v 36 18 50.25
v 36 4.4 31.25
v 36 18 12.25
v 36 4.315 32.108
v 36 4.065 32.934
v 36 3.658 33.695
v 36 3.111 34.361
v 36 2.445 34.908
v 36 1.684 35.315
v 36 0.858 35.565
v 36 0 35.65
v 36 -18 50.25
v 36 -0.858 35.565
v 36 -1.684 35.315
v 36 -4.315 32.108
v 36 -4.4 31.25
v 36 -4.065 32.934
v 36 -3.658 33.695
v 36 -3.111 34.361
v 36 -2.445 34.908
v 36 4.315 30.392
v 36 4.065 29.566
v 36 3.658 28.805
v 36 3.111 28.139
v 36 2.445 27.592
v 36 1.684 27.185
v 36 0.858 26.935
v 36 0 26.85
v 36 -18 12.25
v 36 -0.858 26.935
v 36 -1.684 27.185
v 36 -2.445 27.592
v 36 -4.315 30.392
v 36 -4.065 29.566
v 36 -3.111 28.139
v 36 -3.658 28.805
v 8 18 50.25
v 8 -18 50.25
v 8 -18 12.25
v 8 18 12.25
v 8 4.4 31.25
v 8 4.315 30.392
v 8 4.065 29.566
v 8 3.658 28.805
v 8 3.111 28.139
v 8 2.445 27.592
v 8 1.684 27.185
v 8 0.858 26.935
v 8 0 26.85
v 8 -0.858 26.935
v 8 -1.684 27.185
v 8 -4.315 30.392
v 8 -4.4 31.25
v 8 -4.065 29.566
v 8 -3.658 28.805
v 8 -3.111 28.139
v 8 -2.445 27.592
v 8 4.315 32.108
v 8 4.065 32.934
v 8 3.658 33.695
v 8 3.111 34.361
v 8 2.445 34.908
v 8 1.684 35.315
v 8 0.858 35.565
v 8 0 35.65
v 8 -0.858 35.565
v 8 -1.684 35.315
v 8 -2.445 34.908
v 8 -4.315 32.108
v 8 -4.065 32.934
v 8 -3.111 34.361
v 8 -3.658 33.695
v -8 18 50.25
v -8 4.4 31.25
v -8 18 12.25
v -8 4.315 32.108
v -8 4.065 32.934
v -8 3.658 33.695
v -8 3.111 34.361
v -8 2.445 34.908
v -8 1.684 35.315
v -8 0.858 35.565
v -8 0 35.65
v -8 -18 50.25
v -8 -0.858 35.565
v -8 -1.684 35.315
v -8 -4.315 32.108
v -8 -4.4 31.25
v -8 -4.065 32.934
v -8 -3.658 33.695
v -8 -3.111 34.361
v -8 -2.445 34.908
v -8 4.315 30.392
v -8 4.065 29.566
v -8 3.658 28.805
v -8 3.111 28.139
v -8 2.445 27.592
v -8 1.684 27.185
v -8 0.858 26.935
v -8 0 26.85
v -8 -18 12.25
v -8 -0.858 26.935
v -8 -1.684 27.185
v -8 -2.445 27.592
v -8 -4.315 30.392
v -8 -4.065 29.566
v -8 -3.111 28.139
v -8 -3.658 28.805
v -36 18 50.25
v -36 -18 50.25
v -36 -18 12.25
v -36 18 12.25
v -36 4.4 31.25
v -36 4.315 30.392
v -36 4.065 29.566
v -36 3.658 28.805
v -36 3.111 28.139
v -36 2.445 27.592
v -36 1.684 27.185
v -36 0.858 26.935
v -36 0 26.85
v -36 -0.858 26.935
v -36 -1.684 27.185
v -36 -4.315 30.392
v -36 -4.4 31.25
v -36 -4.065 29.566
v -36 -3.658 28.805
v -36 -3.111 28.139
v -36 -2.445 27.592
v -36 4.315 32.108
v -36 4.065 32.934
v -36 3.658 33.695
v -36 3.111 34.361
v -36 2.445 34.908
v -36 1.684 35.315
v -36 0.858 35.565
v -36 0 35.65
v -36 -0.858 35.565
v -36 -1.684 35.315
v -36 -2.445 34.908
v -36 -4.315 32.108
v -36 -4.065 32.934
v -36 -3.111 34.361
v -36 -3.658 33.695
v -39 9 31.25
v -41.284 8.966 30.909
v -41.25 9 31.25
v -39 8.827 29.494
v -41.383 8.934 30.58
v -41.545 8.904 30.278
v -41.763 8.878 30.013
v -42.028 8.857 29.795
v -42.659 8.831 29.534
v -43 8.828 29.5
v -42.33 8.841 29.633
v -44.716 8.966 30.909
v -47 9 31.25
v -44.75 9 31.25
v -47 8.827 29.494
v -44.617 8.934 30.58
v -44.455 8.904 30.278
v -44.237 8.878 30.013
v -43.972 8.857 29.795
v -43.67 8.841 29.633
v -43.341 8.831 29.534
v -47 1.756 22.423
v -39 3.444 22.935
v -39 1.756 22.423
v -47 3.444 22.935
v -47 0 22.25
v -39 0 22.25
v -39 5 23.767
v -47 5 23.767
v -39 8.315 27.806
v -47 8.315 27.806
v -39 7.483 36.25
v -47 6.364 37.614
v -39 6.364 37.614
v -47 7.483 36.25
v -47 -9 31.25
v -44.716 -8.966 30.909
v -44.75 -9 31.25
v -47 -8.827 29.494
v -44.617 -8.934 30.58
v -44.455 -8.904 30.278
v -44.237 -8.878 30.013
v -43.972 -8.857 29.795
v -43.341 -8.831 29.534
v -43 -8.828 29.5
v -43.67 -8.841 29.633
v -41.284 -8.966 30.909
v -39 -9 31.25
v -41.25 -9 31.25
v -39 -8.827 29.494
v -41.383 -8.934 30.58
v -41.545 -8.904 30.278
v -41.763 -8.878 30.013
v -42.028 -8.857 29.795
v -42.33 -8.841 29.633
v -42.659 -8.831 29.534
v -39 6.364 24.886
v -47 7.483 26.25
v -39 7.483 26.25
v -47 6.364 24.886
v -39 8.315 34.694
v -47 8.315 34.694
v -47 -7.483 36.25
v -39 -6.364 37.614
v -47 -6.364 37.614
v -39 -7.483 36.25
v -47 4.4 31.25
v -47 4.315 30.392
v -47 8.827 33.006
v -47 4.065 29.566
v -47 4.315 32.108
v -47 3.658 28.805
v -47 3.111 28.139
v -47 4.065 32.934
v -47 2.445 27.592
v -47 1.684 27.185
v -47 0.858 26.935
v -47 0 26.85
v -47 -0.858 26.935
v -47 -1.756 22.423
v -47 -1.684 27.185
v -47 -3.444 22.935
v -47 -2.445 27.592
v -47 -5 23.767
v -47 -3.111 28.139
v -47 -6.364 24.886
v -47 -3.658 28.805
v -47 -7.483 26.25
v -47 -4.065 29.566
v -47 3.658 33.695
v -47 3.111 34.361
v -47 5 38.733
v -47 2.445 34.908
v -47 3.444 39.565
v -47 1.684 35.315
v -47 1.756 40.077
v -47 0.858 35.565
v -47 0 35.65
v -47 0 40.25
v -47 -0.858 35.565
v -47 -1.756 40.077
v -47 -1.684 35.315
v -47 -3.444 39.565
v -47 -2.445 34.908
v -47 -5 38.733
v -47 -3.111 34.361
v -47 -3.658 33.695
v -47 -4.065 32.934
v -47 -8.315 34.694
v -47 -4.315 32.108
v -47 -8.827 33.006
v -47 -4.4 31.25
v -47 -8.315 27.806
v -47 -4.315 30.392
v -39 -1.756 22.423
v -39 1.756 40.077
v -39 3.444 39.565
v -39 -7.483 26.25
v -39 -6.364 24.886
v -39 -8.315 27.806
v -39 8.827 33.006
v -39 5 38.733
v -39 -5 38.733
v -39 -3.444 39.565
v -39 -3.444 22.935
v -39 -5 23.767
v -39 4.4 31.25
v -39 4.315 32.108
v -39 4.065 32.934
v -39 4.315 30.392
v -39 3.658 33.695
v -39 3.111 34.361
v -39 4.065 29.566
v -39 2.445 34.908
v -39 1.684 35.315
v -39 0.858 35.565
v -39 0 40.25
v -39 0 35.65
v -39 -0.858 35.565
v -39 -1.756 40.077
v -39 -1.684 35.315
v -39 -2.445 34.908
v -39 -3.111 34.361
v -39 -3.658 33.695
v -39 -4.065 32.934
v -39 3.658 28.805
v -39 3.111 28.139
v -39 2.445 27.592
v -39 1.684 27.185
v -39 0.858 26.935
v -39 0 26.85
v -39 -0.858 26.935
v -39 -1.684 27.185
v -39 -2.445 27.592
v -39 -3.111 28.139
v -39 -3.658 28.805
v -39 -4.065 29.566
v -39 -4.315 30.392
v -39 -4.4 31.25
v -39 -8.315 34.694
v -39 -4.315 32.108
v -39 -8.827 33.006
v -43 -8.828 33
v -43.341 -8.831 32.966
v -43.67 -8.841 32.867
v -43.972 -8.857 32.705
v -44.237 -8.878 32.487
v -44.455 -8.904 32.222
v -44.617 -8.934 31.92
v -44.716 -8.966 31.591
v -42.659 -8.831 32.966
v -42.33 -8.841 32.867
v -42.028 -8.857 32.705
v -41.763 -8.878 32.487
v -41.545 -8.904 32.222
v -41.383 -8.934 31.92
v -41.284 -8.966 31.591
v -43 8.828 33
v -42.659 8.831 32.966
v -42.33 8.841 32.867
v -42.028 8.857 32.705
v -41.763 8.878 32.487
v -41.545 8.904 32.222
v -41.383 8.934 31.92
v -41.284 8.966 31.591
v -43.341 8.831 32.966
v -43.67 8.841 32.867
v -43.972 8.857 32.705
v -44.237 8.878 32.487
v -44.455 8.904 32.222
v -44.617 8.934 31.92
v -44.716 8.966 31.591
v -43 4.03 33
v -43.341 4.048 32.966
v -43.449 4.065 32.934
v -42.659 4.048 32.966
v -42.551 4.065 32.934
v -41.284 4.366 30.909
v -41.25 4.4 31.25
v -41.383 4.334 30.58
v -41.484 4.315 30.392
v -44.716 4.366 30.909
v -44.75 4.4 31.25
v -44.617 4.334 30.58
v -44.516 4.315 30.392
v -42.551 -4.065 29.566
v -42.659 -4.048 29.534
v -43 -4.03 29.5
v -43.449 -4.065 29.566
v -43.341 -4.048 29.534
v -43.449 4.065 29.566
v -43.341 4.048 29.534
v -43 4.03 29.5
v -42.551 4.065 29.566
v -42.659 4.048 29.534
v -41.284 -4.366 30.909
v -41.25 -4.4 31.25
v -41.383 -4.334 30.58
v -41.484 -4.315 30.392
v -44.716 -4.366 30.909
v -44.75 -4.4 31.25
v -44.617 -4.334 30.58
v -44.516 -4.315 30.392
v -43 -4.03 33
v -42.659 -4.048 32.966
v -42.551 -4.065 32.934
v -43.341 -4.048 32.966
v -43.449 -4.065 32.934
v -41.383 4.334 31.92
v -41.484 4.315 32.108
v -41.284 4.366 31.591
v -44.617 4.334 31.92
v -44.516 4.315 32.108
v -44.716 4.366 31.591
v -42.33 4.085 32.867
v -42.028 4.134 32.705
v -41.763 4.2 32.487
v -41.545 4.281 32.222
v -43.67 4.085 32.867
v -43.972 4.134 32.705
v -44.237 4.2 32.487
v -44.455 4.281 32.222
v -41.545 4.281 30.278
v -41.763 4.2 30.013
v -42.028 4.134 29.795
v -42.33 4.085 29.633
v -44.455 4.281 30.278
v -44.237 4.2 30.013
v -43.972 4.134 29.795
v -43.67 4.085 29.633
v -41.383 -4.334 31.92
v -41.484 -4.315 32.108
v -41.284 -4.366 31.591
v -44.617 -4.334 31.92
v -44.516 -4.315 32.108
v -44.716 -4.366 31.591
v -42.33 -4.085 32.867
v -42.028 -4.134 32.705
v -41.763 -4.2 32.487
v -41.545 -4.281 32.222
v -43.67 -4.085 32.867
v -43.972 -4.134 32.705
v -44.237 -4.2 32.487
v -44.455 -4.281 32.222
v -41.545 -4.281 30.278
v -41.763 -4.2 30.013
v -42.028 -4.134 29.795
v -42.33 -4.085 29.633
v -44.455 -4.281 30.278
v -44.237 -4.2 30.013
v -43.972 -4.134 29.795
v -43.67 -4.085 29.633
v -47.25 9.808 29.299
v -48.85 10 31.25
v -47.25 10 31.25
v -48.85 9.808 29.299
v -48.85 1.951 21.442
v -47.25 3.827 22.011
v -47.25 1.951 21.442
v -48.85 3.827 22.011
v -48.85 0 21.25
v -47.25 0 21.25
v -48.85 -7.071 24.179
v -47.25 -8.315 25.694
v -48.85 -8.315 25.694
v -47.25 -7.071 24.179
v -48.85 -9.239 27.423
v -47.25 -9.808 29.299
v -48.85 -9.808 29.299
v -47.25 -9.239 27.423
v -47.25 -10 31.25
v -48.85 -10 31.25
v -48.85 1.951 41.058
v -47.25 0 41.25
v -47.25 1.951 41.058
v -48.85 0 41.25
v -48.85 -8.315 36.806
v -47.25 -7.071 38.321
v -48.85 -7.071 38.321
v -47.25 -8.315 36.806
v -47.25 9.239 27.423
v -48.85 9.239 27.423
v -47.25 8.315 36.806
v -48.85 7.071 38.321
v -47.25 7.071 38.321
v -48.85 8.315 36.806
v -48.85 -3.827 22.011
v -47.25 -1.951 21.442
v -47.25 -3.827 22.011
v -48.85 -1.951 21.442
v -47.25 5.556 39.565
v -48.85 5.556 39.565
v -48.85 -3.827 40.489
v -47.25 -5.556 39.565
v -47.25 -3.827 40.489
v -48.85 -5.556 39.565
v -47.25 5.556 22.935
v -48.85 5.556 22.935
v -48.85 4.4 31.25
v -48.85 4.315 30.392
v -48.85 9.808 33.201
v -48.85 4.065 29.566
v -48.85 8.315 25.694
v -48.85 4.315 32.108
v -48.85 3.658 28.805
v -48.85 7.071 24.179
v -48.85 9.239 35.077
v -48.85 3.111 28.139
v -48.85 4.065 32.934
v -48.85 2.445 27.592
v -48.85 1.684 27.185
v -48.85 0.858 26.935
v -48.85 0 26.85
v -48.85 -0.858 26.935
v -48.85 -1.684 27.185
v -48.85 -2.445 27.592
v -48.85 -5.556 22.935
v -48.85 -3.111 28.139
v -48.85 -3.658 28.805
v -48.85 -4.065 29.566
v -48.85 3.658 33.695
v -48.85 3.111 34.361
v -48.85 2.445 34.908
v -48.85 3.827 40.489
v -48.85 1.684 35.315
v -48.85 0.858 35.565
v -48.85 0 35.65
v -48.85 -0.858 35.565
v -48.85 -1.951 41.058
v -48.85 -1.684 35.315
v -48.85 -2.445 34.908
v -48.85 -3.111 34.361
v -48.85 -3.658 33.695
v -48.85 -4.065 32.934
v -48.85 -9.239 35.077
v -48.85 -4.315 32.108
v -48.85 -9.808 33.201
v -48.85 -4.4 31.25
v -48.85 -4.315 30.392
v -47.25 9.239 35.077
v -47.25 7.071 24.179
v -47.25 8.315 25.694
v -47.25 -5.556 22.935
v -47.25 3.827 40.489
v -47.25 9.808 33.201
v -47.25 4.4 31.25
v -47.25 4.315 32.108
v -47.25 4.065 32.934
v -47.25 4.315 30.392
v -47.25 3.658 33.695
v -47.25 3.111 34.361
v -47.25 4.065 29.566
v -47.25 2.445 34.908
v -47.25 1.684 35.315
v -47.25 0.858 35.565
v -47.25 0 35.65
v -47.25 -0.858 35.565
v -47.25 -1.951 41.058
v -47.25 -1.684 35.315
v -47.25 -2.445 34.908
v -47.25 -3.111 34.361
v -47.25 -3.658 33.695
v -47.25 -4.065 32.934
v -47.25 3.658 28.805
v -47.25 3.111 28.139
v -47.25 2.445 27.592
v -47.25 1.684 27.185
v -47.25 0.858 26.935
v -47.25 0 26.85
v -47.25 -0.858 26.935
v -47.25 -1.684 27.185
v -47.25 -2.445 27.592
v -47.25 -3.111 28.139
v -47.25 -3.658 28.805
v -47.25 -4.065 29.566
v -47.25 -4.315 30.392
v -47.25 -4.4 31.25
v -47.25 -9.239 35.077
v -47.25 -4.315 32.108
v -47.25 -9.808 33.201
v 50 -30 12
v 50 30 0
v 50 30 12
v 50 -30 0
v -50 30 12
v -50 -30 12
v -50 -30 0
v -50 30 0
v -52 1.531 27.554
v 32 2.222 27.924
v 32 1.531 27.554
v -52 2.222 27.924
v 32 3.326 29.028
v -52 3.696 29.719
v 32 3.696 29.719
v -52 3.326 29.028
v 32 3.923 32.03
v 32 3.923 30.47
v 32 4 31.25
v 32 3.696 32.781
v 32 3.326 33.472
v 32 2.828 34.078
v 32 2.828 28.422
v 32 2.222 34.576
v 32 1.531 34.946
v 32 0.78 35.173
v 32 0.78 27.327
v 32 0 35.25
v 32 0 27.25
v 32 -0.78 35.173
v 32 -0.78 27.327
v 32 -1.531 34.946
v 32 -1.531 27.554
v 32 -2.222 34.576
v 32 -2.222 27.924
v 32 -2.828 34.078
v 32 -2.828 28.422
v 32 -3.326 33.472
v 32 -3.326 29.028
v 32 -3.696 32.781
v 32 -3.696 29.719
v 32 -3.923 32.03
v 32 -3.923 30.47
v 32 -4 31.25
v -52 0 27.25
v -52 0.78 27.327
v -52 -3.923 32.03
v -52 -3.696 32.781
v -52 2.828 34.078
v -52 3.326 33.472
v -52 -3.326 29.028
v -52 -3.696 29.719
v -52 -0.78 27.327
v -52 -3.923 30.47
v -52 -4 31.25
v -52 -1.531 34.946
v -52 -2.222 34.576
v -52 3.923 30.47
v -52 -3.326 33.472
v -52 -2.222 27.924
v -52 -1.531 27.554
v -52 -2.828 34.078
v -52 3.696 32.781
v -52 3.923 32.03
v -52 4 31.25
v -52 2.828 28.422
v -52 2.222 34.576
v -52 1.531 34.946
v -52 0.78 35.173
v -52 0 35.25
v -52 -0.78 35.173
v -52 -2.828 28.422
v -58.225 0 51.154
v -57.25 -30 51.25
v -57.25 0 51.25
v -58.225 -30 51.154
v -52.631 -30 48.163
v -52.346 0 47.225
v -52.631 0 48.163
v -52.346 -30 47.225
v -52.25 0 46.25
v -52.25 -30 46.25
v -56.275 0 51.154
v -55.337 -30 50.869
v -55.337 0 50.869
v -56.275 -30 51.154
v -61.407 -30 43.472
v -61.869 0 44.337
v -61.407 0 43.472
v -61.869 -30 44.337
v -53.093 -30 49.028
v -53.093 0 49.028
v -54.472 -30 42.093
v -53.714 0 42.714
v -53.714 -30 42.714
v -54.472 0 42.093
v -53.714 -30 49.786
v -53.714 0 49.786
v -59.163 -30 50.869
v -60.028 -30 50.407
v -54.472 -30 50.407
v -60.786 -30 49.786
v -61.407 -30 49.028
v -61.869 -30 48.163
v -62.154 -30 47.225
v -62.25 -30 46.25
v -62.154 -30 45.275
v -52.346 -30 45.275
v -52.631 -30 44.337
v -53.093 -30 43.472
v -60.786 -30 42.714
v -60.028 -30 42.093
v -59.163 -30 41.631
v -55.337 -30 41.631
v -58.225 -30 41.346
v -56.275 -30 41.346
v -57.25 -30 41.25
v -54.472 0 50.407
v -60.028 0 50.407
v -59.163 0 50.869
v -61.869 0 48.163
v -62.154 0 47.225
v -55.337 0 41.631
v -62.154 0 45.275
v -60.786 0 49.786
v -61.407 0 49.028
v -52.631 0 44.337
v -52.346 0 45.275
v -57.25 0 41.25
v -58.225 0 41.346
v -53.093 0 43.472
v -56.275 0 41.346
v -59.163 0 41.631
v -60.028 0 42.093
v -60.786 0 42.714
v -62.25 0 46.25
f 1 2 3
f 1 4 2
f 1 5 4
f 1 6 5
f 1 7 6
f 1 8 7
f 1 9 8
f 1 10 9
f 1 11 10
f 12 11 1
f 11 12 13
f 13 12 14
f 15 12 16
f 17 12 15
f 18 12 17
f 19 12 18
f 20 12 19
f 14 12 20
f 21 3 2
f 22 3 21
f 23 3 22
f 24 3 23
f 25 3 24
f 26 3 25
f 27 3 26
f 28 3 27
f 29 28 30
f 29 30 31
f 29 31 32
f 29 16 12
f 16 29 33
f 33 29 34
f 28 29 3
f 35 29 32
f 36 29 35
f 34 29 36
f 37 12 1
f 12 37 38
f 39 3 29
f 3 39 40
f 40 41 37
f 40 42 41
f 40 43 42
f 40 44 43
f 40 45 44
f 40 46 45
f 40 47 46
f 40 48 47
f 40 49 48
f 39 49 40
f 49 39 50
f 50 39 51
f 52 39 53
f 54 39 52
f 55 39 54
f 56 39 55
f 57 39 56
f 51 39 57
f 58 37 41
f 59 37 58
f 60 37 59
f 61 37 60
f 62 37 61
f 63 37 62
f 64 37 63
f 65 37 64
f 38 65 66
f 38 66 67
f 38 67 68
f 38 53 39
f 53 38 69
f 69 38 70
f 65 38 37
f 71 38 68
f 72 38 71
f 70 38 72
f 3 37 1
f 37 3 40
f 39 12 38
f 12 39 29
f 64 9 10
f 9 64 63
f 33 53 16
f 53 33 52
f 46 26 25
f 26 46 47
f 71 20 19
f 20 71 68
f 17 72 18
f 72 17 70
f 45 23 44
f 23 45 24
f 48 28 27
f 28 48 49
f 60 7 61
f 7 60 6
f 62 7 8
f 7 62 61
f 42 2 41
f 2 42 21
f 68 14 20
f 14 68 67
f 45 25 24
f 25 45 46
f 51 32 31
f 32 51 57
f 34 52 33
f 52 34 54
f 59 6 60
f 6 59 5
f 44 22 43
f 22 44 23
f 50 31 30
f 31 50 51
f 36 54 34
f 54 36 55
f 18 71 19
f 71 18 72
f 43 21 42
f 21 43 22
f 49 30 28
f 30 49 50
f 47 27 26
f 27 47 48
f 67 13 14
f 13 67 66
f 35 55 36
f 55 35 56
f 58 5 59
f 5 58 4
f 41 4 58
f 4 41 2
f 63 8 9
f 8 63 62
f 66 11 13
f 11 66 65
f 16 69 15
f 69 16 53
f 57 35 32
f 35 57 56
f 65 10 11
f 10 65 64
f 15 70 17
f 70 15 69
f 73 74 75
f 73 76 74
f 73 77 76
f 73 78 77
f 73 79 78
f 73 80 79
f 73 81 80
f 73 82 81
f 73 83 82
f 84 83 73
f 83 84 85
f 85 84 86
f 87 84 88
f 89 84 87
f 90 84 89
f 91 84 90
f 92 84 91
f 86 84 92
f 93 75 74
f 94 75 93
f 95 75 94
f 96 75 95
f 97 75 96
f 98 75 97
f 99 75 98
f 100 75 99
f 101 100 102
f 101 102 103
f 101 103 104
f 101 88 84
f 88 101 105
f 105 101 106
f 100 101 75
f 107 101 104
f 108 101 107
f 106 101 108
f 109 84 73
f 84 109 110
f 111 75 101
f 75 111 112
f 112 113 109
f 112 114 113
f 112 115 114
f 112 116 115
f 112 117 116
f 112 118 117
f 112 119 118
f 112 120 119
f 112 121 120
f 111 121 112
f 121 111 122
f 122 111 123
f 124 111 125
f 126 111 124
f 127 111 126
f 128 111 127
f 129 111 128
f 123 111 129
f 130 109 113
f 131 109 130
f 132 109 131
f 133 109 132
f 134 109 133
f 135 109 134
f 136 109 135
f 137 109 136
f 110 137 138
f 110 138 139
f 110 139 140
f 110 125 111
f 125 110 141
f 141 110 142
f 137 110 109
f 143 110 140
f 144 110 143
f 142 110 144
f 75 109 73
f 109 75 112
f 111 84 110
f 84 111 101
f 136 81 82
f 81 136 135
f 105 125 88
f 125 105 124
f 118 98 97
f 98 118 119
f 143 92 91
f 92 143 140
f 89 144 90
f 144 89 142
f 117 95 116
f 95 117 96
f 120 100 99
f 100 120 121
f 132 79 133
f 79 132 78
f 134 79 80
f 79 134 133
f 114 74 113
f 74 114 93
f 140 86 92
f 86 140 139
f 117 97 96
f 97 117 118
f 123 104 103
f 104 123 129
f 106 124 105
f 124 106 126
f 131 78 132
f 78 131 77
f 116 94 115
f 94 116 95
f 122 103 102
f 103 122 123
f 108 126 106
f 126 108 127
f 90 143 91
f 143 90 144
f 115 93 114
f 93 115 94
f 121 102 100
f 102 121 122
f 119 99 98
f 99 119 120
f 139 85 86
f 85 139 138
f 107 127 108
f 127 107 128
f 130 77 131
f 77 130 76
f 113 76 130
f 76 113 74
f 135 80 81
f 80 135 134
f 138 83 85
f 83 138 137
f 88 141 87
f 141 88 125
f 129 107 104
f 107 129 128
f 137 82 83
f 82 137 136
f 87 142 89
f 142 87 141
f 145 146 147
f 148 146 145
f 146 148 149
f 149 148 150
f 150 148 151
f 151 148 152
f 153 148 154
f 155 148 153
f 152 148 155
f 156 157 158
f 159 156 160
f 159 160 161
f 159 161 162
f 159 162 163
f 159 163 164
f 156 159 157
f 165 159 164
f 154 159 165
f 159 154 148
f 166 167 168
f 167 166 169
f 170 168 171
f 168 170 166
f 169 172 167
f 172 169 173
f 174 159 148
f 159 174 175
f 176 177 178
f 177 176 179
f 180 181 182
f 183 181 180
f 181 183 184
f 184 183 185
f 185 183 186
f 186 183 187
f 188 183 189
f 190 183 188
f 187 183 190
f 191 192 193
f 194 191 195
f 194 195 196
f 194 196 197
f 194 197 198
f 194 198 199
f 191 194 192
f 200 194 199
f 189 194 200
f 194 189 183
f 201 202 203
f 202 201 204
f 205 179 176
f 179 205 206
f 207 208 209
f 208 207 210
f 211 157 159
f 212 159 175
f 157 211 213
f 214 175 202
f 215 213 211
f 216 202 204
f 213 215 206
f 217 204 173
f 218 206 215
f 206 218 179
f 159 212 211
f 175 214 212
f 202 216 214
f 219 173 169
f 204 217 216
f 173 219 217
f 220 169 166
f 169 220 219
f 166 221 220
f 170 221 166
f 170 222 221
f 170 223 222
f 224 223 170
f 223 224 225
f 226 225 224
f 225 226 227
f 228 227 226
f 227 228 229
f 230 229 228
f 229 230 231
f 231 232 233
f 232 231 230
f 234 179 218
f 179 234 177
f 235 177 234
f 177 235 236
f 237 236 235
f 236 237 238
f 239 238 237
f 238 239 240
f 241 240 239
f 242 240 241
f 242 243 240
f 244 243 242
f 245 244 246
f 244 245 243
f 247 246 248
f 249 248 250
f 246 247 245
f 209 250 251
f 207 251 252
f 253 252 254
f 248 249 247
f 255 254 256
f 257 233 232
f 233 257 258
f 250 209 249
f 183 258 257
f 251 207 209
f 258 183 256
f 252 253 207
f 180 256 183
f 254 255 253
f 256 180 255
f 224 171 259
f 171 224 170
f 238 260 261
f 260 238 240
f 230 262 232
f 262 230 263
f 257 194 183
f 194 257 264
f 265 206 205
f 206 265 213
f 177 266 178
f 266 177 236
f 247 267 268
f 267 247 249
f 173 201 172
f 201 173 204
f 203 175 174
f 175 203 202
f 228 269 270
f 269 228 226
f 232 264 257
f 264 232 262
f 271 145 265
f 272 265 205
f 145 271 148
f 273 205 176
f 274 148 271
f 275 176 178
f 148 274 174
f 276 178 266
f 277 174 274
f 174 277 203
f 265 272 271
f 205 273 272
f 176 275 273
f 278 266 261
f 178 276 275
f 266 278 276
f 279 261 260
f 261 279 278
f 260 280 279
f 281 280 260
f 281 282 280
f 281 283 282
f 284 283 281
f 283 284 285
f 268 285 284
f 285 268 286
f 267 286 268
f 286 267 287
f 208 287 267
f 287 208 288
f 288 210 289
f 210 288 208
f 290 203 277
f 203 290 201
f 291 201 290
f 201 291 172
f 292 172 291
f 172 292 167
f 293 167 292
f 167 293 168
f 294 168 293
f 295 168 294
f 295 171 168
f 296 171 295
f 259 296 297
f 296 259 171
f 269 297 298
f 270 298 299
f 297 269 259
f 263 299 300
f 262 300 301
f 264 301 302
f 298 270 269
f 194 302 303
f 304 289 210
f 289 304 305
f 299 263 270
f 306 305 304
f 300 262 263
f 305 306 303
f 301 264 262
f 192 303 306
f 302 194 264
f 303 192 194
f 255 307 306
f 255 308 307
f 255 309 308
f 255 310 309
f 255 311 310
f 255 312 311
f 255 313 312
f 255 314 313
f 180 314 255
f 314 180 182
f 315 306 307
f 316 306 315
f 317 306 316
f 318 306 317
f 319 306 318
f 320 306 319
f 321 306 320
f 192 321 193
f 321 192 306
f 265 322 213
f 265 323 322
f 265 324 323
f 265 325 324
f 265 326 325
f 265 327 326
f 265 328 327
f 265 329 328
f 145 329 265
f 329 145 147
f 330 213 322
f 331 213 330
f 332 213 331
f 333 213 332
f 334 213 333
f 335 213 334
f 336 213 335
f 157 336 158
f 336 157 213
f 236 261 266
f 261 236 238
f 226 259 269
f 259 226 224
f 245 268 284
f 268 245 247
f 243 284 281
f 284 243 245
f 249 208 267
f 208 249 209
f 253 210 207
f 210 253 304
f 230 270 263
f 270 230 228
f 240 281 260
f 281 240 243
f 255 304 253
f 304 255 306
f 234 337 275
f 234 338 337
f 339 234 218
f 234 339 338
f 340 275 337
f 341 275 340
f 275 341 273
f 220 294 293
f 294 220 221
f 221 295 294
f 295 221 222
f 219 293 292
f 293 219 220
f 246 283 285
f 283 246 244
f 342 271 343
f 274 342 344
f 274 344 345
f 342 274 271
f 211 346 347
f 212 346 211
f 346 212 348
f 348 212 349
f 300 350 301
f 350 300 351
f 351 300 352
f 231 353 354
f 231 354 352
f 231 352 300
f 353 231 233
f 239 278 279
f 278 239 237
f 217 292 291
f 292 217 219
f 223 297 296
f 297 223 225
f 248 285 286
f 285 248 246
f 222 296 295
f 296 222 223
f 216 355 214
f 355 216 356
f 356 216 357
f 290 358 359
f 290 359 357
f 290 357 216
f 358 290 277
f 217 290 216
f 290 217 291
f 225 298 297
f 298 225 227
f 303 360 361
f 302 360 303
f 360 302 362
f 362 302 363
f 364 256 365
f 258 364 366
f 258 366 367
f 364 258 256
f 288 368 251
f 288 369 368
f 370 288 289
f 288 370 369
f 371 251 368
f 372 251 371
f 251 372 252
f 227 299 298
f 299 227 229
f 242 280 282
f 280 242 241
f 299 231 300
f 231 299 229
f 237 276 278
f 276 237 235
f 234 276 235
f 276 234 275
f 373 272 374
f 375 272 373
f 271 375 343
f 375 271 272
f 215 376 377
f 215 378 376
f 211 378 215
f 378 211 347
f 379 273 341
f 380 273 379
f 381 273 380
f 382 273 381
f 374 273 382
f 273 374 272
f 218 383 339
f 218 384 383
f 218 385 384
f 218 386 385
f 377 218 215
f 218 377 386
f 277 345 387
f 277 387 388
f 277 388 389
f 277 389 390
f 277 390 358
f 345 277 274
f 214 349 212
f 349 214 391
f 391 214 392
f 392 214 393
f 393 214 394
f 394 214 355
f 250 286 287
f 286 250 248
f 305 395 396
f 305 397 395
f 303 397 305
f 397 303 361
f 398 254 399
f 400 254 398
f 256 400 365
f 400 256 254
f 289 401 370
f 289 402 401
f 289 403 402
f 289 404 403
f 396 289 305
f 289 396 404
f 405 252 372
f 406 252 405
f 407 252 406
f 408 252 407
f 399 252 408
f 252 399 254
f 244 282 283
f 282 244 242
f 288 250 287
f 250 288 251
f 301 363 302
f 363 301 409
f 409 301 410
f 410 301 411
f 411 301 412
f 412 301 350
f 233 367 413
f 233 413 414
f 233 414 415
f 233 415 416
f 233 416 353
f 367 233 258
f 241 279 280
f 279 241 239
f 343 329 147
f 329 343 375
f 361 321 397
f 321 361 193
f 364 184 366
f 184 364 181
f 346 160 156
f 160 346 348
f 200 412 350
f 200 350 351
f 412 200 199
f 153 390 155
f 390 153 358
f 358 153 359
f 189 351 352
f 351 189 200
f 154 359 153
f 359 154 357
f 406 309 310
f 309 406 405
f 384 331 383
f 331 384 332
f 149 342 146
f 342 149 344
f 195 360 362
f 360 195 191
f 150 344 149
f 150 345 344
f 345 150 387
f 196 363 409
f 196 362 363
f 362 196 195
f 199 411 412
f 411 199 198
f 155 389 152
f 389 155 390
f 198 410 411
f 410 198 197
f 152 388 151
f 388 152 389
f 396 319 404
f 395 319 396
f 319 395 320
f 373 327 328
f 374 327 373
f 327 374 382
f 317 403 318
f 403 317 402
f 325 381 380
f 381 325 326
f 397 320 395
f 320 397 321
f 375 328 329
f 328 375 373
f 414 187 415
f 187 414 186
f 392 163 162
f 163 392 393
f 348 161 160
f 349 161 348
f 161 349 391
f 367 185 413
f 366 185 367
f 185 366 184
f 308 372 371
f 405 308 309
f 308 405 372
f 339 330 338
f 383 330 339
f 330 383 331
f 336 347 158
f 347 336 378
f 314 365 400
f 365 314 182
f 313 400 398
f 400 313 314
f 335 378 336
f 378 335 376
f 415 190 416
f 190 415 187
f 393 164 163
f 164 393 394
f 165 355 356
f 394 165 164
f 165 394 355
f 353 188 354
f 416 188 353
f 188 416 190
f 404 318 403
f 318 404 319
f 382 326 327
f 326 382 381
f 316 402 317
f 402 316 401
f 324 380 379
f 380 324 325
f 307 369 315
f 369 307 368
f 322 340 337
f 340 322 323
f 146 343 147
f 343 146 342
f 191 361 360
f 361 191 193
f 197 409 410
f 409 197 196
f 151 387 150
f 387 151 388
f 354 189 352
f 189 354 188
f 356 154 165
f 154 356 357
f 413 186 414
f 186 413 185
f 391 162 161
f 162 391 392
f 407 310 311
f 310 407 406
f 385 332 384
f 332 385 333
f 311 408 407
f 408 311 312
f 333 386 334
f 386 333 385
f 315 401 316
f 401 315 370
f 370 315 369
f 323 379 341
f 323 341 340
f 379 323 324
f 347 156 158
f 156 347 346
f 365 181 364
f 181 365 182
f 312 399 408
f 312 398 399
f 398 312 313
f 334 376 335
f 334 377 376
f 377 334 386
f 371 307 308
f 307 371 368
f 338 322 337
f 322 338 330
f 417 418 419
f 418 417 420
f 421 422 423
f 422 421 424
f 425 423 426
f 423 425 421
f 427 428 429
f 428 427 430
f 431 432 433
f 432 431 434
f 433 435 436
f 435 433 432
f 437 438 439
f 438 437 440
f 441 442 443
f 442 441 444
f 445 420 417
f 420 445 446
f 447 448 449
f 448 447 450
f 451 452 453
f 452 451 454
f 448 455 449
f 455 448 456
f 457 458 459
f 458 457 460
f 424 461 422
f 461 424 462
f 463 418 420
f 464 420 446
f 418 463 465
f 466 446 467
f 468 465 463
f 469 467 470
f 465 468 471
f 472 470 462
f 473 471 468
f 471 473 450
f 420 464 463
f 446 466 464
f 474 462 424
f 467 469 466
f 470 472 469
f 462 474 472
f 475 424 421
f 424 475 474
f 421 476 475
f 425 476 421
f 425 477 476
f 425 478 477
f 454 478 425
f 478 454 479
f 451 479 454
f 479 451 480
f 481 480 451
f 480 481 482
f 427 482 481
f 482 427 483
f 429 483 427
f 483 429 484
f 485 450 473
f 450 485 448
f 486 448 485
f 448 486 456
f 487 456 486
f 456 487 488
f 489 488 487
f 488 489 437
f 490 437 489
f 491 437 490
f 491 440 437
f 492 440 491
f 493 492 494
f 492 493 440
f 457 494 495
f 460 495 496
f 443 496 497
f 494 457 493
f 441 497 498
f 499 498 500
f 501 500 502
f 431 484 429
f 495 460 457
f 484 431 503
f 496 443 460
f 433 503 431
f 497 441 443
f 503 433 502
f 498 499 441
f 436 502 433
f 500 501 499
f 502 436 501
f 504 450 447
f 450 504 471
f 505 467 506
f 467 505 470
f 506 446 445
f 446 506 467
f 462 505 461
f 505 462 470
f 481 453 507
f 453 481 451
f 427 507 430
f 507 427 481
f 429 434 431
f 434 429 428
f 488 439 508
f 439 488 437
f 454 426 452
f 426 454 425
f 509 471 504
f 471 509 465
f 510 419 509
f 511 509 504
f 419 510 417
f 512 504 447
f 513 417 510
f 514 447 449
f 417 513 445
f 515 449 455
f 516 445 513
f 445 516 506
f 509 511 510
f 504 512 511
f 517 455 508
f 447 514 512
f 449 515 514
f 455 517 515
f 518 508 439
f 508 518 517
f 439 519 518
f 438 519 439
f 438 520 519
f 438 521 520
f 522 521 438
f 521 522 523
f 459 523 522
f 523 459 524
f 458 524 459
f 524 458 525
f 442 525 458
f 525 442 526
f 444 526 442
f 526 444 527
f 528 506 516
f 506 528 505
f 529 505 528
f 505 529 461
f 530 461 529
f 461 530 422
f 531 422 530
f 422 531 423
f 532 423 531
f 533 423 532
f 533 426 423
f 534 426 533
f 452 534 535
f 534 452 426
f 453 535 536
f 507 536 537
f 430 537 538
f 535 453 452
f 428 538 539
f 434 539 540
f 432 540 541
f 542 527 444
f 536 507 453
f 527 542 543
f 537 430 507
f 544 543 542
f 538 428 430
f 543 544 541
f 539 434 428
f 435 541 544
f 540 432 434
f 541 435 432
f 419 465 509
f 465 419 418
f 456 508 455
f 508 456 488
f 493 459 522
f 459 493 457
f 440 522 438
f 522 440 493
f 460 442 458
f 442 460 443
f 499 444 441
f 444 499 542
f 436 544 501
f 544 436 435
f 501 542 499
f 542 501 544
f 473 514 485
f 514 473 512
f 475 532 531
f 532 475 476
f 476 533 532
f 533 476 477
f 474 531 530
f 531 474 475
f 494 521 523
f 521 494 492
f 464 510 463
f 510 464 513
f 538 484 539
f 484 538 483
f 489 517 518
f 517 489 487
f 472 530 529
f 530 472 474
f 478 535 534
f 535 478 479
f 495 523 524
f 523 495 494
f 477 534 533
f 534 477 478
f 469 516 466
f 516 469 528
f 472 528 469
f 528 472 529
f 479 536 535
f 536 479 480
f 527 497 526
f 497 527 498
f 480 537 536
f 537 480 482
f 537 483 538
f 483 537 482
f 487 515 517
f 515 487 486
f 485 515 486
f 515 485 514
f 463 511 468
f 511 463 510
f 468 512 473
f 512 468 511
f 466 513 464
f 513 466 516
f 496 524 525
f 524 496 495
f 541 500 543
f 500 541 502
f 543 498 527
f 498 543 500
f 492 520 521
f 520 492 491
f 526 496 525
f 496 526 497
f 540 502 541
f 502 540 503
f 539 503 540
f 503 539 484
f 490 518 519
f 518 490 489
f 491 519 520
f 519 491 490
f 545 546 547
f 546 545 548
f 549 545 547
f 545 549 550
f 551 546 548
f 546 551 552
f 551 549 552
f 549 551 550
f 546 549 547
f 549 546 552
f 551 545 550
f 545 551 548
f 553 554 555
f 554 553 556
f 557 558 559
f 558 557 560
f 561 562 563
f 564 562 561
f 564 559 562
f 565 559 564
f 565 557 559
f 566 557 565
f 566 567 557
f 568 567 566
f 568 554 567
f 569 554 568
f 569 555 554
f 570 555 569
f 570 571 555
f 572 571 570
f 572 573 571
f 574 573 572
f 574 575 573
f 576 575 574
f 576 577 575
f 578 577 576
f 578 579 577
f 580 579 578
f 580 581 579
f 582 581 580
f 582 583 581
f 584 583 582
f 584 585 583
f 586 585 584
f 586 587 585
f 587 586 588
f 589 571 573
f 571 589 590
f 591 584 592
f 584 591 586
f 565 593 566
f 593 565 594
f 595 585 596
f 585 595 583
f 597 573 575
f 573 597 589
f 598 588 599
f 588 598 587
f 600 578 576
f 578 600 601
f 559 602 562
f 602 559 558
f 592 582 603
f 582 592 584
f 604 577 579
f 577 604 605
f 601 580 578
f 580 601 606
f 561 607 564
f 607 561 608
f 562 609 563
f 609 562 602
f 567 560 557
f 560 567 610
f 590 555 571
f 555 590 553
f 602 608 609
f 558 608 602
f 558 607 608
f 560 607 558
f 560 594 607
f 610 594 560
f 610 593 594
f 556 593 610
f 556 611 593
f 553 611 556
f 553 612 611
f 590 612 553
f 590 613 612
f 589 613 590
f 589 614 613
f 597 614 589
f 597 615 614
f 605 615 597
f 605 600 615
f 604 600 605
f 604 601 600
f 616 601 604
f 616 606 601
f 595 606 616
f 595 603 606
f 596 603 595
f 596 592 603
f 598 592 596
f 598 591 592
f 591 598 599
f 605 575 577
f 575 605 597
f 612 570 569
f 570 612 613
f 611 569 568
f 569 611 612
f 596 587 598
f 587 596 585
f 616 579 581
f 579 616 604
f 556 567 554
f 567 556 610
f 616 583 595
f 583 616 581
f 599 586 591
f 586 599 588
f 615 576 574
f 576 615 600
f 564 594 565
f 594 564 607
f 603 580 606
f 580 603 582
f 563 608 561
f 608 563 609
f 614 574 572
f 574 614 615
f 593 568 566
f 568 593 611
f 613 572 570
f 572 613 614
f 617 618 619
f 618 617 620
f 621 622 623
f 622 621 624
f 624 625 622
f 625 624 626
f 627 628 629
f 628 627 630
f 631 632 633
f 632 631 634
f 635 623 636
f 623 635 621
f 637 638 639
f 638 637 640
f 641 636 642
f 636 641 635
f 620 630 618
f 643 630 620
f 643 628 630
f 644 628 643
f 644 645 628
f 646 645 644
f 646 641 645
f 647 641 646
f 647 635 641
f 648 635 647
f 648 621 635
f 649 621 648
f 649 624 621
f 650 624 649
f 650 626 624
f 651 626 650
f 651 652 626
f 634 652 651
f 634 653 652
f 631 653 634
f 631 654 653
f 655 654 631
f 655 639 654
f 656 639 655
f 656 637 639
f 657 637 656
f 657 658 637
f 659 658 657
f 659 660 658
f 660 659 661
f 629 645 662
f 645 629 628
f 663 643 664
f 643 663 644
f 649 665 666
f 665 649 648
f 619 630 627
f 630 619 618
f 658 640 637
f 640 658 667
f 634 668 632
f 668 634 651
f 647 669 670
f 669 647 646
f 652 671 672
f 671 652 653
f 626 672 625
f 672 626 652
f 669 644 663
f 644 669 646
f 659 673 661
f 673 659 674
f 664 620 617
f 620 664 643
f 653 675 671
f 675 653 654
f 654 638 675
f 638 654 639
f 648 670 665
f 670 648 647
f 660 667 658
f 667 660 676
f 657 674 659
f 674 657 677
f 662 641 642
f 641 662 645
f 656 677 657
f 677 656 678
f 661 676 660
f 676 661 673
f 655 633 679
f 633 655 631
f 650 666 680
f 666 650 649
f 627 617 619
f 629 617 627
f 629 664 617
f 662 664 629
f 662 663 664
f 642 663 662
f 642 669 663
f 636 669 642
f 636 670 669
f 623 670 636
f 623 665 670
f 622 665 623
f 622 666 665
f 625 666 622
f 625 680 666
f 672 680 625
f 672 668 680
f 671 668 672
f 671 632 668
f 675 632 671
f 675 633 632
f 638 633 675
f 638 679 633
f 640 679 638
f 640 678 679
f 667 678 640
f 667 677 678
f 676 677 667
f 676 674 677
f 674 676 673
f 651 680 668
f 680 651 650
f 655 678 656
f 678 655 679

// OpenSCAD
$fn = 32;

// ------------------------------------------------------------------------
// Machine vise: screw d8, jaws 28 x 38 mm
// Every part is its own module, assembly() places every instance.
// ------------------------------------------------------------------------

// --- part 1 ---
module vise_bed() {
  difference() {
    translate([-50, -30, 0]) cube([100, 60, 12]);
  }
}

// --- part 2 ---
module vise_jaw() {
  difference() {
    translate([-14, -18, 0]) cube([28, 36, 38]);
    translate([0, 0, 19]) rotate([0, 90, 0]) cylinder(h = 30, d = 8.8, center = true);
  }
}

// --- part 3 ---
module vise_screw() {
  translate([0, 0, -42]) cylinder(h = 84, d = 8);
}

// --- part 4 ---
module screw_collar() {
  difference() {
    cylinder(h = 8, d = 18);
    translate([0, 0, -1]) cylinder(h = 10, d = 8.8);
    translate([0, 0, 4]) rotate([90, 0, 0]) cylinder(h = 20, d = 3.5, center = true);
  }
}

// --- part 5 ---
module screw_washer() {
  difference() {
      translate([0, 0, 0]) cylinder(h = 1.6, d = 20);
      translate([0, 0, -1]) cylinder(h = 3.6, d = 8.8);
    }
}

// --- part 6 ---
module vise_handle() {
  cylinder(h = 30, d = 10);
}

// --- assembly ---
module assembly() {
  color([0.80, 0.24, 0.20]) translate([0, 0, 0]) rotate([0, 0, 0]) vise_bed();
  color([0.20, 0.45, 0.75]) translate([22, 0, 12.25]) rotate([0, 0, 0]) vise_jaw();
  color([0.25, 0.62, 0.32]) translate([-22, 0, 12.25]) rotate([0, 0, 0]) vise_jaw();
  color([0.92, 0.70, 0.18]) translate([-10, 0, 31.25]) rotate([0, 90, 0]) vise_screw();
  color([0.58, 0.35, 0.70]) translate([-47, 0, 31.25]) rotate([0, 90, 0]) screw_collar();
  color([0.16, 0.66, 0.66]) translate([-48.85, 0, 31.25]) rotate([0, 90, 0]) screw_washer();
  color([0.85, 0.48, 0.18]) translate([-57.25, 0, 46.25]) rotate([90, 0, 0]) vise_handle();
}

assembly();
